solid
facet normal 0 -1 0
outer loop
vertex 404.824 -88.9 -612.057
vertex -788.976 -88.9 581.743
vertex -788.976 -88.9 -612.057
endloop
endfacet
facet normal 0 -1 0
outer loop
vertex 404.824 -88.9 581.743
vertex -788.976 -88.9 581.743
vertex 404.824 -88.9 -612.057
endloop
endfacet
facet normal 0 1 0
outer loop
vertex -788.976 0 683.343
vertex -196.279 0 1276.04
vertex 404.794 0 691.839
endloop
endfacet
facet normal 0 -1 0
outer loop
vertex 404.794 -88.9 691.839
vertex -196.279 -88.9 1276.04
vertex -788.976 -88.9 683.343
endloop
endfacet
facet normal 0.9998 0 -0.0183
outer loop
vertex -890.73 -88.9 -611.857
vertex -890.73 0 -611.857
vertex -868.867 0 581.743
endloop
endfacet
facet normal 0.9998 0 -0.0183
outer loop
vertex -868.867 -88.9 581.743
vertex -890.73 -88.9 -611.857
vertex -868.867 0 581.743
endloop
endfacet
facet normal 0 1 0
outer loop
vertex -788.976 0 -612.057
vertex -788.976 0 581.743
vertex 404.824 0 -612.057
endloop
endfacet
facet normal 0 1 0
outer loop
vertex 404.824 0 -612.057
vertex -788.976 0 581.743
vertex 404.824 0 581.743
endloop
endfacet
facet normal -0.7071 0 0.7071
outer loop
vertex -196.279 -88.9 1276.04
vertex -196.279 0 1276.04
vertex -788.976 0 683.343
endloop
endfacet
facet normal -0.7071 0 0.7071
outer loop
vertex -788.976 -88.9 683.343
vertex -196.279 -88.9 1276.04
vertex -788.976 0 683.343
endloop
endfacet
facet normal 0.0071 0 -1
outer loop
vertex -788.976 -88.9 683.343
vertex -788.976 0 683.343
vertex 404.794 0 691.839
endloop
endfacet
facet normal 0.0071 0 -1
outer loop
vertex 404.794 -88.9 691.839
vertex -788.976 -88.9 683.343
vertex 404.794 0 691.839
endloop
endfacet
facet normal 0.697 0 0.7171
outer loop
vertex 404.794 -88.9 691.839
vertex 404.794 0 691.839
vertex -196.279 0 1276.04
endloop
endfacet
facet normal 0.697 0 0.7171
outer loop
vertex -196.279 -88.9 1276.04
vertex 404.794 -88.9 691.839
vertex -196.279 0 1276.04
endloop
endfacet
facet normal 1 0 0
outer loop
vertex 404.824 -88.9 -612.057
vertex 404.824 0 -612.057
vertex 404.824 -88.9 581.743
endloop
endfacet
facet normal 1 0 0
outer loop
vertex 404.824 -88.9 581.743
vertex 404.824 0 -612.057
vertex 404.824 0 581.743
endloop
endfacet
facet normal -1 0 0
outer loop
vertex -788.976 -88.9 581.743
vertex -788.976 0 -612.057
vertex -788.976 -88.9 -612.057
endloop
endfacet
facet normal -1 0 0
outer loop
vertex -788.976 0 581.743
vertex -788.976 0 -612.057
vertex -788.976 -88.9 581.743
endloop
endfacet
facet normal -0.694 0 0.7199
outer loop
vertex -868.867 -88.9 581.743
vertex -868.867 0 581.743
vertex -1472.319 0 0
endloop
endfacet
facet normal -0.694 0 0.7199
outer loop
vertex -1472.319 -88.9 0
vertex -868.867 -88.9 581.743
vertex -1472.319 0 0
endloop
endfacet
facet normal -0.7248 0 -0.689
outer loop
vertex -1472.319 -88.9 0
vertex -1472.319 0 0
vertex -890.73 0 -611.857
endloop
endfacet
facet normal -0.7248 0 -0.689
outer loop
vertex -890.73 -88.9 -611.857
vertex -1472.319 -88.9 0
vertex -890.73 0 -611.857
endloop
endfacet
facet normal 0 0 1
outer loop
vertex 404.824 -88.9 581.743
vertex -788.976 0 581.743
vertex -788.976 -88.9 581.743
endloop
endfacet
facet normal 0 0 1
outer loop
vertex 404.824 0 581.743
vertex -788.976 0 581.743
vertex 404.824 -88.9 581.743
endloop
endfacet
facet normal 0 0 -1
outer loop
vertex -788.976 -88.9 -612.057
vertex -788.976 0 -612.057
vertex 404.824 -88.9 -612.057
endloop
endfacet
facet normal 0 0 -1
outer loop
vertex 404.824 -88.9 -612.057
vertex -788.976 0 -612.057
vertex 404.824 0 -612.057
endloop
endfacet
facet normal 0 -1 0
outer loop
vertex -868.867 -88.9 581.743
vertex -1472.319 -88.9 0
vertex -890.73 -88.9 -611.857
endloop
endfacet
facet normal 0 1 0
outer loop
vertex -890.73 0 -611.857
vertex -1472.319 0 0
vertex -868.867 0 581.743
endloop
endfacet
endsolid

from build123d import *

# Parameters (mm, degrees)
F0_W     = 1193.8
F0_H     = 1193.8
F1_DEPTH = 88.9
F3_DEPTH = 88.9
F5_DEPTH = 88.9


with BuildPart() as f1:
    # F0 (on Front) → F1 (new body)
    with BuildSketch(Plane.XZ):
        with Locations((-192.075821, -15.156937)):
            Rectangle(F0_W, F0_H)
    extrude(amount=F1_DEPTH)


with BuildPart() as f3:
    # F2 (on Front) → F3 (new body)
    with BuildSketch(Plane.XZ):
        Polygon((-890.729769, -611.856726), (-868.866939, 581.743063), (-1472.318884, 0), align=None)
    extrude(amount=F3_DEPTH)


with BuildPart() as f5:
    # F4 (on Front) → F5 (new body)
    with BuildSketch(Plane.XZ):
        Polygon((-788.975821, 683.343063), (404.793947, 691.8391), (-196.278917, 1276.039967), align=None)
    extrude(amount=F5_DEPTH)


solid = Compound([f1.part, f3.part, f5.part])
